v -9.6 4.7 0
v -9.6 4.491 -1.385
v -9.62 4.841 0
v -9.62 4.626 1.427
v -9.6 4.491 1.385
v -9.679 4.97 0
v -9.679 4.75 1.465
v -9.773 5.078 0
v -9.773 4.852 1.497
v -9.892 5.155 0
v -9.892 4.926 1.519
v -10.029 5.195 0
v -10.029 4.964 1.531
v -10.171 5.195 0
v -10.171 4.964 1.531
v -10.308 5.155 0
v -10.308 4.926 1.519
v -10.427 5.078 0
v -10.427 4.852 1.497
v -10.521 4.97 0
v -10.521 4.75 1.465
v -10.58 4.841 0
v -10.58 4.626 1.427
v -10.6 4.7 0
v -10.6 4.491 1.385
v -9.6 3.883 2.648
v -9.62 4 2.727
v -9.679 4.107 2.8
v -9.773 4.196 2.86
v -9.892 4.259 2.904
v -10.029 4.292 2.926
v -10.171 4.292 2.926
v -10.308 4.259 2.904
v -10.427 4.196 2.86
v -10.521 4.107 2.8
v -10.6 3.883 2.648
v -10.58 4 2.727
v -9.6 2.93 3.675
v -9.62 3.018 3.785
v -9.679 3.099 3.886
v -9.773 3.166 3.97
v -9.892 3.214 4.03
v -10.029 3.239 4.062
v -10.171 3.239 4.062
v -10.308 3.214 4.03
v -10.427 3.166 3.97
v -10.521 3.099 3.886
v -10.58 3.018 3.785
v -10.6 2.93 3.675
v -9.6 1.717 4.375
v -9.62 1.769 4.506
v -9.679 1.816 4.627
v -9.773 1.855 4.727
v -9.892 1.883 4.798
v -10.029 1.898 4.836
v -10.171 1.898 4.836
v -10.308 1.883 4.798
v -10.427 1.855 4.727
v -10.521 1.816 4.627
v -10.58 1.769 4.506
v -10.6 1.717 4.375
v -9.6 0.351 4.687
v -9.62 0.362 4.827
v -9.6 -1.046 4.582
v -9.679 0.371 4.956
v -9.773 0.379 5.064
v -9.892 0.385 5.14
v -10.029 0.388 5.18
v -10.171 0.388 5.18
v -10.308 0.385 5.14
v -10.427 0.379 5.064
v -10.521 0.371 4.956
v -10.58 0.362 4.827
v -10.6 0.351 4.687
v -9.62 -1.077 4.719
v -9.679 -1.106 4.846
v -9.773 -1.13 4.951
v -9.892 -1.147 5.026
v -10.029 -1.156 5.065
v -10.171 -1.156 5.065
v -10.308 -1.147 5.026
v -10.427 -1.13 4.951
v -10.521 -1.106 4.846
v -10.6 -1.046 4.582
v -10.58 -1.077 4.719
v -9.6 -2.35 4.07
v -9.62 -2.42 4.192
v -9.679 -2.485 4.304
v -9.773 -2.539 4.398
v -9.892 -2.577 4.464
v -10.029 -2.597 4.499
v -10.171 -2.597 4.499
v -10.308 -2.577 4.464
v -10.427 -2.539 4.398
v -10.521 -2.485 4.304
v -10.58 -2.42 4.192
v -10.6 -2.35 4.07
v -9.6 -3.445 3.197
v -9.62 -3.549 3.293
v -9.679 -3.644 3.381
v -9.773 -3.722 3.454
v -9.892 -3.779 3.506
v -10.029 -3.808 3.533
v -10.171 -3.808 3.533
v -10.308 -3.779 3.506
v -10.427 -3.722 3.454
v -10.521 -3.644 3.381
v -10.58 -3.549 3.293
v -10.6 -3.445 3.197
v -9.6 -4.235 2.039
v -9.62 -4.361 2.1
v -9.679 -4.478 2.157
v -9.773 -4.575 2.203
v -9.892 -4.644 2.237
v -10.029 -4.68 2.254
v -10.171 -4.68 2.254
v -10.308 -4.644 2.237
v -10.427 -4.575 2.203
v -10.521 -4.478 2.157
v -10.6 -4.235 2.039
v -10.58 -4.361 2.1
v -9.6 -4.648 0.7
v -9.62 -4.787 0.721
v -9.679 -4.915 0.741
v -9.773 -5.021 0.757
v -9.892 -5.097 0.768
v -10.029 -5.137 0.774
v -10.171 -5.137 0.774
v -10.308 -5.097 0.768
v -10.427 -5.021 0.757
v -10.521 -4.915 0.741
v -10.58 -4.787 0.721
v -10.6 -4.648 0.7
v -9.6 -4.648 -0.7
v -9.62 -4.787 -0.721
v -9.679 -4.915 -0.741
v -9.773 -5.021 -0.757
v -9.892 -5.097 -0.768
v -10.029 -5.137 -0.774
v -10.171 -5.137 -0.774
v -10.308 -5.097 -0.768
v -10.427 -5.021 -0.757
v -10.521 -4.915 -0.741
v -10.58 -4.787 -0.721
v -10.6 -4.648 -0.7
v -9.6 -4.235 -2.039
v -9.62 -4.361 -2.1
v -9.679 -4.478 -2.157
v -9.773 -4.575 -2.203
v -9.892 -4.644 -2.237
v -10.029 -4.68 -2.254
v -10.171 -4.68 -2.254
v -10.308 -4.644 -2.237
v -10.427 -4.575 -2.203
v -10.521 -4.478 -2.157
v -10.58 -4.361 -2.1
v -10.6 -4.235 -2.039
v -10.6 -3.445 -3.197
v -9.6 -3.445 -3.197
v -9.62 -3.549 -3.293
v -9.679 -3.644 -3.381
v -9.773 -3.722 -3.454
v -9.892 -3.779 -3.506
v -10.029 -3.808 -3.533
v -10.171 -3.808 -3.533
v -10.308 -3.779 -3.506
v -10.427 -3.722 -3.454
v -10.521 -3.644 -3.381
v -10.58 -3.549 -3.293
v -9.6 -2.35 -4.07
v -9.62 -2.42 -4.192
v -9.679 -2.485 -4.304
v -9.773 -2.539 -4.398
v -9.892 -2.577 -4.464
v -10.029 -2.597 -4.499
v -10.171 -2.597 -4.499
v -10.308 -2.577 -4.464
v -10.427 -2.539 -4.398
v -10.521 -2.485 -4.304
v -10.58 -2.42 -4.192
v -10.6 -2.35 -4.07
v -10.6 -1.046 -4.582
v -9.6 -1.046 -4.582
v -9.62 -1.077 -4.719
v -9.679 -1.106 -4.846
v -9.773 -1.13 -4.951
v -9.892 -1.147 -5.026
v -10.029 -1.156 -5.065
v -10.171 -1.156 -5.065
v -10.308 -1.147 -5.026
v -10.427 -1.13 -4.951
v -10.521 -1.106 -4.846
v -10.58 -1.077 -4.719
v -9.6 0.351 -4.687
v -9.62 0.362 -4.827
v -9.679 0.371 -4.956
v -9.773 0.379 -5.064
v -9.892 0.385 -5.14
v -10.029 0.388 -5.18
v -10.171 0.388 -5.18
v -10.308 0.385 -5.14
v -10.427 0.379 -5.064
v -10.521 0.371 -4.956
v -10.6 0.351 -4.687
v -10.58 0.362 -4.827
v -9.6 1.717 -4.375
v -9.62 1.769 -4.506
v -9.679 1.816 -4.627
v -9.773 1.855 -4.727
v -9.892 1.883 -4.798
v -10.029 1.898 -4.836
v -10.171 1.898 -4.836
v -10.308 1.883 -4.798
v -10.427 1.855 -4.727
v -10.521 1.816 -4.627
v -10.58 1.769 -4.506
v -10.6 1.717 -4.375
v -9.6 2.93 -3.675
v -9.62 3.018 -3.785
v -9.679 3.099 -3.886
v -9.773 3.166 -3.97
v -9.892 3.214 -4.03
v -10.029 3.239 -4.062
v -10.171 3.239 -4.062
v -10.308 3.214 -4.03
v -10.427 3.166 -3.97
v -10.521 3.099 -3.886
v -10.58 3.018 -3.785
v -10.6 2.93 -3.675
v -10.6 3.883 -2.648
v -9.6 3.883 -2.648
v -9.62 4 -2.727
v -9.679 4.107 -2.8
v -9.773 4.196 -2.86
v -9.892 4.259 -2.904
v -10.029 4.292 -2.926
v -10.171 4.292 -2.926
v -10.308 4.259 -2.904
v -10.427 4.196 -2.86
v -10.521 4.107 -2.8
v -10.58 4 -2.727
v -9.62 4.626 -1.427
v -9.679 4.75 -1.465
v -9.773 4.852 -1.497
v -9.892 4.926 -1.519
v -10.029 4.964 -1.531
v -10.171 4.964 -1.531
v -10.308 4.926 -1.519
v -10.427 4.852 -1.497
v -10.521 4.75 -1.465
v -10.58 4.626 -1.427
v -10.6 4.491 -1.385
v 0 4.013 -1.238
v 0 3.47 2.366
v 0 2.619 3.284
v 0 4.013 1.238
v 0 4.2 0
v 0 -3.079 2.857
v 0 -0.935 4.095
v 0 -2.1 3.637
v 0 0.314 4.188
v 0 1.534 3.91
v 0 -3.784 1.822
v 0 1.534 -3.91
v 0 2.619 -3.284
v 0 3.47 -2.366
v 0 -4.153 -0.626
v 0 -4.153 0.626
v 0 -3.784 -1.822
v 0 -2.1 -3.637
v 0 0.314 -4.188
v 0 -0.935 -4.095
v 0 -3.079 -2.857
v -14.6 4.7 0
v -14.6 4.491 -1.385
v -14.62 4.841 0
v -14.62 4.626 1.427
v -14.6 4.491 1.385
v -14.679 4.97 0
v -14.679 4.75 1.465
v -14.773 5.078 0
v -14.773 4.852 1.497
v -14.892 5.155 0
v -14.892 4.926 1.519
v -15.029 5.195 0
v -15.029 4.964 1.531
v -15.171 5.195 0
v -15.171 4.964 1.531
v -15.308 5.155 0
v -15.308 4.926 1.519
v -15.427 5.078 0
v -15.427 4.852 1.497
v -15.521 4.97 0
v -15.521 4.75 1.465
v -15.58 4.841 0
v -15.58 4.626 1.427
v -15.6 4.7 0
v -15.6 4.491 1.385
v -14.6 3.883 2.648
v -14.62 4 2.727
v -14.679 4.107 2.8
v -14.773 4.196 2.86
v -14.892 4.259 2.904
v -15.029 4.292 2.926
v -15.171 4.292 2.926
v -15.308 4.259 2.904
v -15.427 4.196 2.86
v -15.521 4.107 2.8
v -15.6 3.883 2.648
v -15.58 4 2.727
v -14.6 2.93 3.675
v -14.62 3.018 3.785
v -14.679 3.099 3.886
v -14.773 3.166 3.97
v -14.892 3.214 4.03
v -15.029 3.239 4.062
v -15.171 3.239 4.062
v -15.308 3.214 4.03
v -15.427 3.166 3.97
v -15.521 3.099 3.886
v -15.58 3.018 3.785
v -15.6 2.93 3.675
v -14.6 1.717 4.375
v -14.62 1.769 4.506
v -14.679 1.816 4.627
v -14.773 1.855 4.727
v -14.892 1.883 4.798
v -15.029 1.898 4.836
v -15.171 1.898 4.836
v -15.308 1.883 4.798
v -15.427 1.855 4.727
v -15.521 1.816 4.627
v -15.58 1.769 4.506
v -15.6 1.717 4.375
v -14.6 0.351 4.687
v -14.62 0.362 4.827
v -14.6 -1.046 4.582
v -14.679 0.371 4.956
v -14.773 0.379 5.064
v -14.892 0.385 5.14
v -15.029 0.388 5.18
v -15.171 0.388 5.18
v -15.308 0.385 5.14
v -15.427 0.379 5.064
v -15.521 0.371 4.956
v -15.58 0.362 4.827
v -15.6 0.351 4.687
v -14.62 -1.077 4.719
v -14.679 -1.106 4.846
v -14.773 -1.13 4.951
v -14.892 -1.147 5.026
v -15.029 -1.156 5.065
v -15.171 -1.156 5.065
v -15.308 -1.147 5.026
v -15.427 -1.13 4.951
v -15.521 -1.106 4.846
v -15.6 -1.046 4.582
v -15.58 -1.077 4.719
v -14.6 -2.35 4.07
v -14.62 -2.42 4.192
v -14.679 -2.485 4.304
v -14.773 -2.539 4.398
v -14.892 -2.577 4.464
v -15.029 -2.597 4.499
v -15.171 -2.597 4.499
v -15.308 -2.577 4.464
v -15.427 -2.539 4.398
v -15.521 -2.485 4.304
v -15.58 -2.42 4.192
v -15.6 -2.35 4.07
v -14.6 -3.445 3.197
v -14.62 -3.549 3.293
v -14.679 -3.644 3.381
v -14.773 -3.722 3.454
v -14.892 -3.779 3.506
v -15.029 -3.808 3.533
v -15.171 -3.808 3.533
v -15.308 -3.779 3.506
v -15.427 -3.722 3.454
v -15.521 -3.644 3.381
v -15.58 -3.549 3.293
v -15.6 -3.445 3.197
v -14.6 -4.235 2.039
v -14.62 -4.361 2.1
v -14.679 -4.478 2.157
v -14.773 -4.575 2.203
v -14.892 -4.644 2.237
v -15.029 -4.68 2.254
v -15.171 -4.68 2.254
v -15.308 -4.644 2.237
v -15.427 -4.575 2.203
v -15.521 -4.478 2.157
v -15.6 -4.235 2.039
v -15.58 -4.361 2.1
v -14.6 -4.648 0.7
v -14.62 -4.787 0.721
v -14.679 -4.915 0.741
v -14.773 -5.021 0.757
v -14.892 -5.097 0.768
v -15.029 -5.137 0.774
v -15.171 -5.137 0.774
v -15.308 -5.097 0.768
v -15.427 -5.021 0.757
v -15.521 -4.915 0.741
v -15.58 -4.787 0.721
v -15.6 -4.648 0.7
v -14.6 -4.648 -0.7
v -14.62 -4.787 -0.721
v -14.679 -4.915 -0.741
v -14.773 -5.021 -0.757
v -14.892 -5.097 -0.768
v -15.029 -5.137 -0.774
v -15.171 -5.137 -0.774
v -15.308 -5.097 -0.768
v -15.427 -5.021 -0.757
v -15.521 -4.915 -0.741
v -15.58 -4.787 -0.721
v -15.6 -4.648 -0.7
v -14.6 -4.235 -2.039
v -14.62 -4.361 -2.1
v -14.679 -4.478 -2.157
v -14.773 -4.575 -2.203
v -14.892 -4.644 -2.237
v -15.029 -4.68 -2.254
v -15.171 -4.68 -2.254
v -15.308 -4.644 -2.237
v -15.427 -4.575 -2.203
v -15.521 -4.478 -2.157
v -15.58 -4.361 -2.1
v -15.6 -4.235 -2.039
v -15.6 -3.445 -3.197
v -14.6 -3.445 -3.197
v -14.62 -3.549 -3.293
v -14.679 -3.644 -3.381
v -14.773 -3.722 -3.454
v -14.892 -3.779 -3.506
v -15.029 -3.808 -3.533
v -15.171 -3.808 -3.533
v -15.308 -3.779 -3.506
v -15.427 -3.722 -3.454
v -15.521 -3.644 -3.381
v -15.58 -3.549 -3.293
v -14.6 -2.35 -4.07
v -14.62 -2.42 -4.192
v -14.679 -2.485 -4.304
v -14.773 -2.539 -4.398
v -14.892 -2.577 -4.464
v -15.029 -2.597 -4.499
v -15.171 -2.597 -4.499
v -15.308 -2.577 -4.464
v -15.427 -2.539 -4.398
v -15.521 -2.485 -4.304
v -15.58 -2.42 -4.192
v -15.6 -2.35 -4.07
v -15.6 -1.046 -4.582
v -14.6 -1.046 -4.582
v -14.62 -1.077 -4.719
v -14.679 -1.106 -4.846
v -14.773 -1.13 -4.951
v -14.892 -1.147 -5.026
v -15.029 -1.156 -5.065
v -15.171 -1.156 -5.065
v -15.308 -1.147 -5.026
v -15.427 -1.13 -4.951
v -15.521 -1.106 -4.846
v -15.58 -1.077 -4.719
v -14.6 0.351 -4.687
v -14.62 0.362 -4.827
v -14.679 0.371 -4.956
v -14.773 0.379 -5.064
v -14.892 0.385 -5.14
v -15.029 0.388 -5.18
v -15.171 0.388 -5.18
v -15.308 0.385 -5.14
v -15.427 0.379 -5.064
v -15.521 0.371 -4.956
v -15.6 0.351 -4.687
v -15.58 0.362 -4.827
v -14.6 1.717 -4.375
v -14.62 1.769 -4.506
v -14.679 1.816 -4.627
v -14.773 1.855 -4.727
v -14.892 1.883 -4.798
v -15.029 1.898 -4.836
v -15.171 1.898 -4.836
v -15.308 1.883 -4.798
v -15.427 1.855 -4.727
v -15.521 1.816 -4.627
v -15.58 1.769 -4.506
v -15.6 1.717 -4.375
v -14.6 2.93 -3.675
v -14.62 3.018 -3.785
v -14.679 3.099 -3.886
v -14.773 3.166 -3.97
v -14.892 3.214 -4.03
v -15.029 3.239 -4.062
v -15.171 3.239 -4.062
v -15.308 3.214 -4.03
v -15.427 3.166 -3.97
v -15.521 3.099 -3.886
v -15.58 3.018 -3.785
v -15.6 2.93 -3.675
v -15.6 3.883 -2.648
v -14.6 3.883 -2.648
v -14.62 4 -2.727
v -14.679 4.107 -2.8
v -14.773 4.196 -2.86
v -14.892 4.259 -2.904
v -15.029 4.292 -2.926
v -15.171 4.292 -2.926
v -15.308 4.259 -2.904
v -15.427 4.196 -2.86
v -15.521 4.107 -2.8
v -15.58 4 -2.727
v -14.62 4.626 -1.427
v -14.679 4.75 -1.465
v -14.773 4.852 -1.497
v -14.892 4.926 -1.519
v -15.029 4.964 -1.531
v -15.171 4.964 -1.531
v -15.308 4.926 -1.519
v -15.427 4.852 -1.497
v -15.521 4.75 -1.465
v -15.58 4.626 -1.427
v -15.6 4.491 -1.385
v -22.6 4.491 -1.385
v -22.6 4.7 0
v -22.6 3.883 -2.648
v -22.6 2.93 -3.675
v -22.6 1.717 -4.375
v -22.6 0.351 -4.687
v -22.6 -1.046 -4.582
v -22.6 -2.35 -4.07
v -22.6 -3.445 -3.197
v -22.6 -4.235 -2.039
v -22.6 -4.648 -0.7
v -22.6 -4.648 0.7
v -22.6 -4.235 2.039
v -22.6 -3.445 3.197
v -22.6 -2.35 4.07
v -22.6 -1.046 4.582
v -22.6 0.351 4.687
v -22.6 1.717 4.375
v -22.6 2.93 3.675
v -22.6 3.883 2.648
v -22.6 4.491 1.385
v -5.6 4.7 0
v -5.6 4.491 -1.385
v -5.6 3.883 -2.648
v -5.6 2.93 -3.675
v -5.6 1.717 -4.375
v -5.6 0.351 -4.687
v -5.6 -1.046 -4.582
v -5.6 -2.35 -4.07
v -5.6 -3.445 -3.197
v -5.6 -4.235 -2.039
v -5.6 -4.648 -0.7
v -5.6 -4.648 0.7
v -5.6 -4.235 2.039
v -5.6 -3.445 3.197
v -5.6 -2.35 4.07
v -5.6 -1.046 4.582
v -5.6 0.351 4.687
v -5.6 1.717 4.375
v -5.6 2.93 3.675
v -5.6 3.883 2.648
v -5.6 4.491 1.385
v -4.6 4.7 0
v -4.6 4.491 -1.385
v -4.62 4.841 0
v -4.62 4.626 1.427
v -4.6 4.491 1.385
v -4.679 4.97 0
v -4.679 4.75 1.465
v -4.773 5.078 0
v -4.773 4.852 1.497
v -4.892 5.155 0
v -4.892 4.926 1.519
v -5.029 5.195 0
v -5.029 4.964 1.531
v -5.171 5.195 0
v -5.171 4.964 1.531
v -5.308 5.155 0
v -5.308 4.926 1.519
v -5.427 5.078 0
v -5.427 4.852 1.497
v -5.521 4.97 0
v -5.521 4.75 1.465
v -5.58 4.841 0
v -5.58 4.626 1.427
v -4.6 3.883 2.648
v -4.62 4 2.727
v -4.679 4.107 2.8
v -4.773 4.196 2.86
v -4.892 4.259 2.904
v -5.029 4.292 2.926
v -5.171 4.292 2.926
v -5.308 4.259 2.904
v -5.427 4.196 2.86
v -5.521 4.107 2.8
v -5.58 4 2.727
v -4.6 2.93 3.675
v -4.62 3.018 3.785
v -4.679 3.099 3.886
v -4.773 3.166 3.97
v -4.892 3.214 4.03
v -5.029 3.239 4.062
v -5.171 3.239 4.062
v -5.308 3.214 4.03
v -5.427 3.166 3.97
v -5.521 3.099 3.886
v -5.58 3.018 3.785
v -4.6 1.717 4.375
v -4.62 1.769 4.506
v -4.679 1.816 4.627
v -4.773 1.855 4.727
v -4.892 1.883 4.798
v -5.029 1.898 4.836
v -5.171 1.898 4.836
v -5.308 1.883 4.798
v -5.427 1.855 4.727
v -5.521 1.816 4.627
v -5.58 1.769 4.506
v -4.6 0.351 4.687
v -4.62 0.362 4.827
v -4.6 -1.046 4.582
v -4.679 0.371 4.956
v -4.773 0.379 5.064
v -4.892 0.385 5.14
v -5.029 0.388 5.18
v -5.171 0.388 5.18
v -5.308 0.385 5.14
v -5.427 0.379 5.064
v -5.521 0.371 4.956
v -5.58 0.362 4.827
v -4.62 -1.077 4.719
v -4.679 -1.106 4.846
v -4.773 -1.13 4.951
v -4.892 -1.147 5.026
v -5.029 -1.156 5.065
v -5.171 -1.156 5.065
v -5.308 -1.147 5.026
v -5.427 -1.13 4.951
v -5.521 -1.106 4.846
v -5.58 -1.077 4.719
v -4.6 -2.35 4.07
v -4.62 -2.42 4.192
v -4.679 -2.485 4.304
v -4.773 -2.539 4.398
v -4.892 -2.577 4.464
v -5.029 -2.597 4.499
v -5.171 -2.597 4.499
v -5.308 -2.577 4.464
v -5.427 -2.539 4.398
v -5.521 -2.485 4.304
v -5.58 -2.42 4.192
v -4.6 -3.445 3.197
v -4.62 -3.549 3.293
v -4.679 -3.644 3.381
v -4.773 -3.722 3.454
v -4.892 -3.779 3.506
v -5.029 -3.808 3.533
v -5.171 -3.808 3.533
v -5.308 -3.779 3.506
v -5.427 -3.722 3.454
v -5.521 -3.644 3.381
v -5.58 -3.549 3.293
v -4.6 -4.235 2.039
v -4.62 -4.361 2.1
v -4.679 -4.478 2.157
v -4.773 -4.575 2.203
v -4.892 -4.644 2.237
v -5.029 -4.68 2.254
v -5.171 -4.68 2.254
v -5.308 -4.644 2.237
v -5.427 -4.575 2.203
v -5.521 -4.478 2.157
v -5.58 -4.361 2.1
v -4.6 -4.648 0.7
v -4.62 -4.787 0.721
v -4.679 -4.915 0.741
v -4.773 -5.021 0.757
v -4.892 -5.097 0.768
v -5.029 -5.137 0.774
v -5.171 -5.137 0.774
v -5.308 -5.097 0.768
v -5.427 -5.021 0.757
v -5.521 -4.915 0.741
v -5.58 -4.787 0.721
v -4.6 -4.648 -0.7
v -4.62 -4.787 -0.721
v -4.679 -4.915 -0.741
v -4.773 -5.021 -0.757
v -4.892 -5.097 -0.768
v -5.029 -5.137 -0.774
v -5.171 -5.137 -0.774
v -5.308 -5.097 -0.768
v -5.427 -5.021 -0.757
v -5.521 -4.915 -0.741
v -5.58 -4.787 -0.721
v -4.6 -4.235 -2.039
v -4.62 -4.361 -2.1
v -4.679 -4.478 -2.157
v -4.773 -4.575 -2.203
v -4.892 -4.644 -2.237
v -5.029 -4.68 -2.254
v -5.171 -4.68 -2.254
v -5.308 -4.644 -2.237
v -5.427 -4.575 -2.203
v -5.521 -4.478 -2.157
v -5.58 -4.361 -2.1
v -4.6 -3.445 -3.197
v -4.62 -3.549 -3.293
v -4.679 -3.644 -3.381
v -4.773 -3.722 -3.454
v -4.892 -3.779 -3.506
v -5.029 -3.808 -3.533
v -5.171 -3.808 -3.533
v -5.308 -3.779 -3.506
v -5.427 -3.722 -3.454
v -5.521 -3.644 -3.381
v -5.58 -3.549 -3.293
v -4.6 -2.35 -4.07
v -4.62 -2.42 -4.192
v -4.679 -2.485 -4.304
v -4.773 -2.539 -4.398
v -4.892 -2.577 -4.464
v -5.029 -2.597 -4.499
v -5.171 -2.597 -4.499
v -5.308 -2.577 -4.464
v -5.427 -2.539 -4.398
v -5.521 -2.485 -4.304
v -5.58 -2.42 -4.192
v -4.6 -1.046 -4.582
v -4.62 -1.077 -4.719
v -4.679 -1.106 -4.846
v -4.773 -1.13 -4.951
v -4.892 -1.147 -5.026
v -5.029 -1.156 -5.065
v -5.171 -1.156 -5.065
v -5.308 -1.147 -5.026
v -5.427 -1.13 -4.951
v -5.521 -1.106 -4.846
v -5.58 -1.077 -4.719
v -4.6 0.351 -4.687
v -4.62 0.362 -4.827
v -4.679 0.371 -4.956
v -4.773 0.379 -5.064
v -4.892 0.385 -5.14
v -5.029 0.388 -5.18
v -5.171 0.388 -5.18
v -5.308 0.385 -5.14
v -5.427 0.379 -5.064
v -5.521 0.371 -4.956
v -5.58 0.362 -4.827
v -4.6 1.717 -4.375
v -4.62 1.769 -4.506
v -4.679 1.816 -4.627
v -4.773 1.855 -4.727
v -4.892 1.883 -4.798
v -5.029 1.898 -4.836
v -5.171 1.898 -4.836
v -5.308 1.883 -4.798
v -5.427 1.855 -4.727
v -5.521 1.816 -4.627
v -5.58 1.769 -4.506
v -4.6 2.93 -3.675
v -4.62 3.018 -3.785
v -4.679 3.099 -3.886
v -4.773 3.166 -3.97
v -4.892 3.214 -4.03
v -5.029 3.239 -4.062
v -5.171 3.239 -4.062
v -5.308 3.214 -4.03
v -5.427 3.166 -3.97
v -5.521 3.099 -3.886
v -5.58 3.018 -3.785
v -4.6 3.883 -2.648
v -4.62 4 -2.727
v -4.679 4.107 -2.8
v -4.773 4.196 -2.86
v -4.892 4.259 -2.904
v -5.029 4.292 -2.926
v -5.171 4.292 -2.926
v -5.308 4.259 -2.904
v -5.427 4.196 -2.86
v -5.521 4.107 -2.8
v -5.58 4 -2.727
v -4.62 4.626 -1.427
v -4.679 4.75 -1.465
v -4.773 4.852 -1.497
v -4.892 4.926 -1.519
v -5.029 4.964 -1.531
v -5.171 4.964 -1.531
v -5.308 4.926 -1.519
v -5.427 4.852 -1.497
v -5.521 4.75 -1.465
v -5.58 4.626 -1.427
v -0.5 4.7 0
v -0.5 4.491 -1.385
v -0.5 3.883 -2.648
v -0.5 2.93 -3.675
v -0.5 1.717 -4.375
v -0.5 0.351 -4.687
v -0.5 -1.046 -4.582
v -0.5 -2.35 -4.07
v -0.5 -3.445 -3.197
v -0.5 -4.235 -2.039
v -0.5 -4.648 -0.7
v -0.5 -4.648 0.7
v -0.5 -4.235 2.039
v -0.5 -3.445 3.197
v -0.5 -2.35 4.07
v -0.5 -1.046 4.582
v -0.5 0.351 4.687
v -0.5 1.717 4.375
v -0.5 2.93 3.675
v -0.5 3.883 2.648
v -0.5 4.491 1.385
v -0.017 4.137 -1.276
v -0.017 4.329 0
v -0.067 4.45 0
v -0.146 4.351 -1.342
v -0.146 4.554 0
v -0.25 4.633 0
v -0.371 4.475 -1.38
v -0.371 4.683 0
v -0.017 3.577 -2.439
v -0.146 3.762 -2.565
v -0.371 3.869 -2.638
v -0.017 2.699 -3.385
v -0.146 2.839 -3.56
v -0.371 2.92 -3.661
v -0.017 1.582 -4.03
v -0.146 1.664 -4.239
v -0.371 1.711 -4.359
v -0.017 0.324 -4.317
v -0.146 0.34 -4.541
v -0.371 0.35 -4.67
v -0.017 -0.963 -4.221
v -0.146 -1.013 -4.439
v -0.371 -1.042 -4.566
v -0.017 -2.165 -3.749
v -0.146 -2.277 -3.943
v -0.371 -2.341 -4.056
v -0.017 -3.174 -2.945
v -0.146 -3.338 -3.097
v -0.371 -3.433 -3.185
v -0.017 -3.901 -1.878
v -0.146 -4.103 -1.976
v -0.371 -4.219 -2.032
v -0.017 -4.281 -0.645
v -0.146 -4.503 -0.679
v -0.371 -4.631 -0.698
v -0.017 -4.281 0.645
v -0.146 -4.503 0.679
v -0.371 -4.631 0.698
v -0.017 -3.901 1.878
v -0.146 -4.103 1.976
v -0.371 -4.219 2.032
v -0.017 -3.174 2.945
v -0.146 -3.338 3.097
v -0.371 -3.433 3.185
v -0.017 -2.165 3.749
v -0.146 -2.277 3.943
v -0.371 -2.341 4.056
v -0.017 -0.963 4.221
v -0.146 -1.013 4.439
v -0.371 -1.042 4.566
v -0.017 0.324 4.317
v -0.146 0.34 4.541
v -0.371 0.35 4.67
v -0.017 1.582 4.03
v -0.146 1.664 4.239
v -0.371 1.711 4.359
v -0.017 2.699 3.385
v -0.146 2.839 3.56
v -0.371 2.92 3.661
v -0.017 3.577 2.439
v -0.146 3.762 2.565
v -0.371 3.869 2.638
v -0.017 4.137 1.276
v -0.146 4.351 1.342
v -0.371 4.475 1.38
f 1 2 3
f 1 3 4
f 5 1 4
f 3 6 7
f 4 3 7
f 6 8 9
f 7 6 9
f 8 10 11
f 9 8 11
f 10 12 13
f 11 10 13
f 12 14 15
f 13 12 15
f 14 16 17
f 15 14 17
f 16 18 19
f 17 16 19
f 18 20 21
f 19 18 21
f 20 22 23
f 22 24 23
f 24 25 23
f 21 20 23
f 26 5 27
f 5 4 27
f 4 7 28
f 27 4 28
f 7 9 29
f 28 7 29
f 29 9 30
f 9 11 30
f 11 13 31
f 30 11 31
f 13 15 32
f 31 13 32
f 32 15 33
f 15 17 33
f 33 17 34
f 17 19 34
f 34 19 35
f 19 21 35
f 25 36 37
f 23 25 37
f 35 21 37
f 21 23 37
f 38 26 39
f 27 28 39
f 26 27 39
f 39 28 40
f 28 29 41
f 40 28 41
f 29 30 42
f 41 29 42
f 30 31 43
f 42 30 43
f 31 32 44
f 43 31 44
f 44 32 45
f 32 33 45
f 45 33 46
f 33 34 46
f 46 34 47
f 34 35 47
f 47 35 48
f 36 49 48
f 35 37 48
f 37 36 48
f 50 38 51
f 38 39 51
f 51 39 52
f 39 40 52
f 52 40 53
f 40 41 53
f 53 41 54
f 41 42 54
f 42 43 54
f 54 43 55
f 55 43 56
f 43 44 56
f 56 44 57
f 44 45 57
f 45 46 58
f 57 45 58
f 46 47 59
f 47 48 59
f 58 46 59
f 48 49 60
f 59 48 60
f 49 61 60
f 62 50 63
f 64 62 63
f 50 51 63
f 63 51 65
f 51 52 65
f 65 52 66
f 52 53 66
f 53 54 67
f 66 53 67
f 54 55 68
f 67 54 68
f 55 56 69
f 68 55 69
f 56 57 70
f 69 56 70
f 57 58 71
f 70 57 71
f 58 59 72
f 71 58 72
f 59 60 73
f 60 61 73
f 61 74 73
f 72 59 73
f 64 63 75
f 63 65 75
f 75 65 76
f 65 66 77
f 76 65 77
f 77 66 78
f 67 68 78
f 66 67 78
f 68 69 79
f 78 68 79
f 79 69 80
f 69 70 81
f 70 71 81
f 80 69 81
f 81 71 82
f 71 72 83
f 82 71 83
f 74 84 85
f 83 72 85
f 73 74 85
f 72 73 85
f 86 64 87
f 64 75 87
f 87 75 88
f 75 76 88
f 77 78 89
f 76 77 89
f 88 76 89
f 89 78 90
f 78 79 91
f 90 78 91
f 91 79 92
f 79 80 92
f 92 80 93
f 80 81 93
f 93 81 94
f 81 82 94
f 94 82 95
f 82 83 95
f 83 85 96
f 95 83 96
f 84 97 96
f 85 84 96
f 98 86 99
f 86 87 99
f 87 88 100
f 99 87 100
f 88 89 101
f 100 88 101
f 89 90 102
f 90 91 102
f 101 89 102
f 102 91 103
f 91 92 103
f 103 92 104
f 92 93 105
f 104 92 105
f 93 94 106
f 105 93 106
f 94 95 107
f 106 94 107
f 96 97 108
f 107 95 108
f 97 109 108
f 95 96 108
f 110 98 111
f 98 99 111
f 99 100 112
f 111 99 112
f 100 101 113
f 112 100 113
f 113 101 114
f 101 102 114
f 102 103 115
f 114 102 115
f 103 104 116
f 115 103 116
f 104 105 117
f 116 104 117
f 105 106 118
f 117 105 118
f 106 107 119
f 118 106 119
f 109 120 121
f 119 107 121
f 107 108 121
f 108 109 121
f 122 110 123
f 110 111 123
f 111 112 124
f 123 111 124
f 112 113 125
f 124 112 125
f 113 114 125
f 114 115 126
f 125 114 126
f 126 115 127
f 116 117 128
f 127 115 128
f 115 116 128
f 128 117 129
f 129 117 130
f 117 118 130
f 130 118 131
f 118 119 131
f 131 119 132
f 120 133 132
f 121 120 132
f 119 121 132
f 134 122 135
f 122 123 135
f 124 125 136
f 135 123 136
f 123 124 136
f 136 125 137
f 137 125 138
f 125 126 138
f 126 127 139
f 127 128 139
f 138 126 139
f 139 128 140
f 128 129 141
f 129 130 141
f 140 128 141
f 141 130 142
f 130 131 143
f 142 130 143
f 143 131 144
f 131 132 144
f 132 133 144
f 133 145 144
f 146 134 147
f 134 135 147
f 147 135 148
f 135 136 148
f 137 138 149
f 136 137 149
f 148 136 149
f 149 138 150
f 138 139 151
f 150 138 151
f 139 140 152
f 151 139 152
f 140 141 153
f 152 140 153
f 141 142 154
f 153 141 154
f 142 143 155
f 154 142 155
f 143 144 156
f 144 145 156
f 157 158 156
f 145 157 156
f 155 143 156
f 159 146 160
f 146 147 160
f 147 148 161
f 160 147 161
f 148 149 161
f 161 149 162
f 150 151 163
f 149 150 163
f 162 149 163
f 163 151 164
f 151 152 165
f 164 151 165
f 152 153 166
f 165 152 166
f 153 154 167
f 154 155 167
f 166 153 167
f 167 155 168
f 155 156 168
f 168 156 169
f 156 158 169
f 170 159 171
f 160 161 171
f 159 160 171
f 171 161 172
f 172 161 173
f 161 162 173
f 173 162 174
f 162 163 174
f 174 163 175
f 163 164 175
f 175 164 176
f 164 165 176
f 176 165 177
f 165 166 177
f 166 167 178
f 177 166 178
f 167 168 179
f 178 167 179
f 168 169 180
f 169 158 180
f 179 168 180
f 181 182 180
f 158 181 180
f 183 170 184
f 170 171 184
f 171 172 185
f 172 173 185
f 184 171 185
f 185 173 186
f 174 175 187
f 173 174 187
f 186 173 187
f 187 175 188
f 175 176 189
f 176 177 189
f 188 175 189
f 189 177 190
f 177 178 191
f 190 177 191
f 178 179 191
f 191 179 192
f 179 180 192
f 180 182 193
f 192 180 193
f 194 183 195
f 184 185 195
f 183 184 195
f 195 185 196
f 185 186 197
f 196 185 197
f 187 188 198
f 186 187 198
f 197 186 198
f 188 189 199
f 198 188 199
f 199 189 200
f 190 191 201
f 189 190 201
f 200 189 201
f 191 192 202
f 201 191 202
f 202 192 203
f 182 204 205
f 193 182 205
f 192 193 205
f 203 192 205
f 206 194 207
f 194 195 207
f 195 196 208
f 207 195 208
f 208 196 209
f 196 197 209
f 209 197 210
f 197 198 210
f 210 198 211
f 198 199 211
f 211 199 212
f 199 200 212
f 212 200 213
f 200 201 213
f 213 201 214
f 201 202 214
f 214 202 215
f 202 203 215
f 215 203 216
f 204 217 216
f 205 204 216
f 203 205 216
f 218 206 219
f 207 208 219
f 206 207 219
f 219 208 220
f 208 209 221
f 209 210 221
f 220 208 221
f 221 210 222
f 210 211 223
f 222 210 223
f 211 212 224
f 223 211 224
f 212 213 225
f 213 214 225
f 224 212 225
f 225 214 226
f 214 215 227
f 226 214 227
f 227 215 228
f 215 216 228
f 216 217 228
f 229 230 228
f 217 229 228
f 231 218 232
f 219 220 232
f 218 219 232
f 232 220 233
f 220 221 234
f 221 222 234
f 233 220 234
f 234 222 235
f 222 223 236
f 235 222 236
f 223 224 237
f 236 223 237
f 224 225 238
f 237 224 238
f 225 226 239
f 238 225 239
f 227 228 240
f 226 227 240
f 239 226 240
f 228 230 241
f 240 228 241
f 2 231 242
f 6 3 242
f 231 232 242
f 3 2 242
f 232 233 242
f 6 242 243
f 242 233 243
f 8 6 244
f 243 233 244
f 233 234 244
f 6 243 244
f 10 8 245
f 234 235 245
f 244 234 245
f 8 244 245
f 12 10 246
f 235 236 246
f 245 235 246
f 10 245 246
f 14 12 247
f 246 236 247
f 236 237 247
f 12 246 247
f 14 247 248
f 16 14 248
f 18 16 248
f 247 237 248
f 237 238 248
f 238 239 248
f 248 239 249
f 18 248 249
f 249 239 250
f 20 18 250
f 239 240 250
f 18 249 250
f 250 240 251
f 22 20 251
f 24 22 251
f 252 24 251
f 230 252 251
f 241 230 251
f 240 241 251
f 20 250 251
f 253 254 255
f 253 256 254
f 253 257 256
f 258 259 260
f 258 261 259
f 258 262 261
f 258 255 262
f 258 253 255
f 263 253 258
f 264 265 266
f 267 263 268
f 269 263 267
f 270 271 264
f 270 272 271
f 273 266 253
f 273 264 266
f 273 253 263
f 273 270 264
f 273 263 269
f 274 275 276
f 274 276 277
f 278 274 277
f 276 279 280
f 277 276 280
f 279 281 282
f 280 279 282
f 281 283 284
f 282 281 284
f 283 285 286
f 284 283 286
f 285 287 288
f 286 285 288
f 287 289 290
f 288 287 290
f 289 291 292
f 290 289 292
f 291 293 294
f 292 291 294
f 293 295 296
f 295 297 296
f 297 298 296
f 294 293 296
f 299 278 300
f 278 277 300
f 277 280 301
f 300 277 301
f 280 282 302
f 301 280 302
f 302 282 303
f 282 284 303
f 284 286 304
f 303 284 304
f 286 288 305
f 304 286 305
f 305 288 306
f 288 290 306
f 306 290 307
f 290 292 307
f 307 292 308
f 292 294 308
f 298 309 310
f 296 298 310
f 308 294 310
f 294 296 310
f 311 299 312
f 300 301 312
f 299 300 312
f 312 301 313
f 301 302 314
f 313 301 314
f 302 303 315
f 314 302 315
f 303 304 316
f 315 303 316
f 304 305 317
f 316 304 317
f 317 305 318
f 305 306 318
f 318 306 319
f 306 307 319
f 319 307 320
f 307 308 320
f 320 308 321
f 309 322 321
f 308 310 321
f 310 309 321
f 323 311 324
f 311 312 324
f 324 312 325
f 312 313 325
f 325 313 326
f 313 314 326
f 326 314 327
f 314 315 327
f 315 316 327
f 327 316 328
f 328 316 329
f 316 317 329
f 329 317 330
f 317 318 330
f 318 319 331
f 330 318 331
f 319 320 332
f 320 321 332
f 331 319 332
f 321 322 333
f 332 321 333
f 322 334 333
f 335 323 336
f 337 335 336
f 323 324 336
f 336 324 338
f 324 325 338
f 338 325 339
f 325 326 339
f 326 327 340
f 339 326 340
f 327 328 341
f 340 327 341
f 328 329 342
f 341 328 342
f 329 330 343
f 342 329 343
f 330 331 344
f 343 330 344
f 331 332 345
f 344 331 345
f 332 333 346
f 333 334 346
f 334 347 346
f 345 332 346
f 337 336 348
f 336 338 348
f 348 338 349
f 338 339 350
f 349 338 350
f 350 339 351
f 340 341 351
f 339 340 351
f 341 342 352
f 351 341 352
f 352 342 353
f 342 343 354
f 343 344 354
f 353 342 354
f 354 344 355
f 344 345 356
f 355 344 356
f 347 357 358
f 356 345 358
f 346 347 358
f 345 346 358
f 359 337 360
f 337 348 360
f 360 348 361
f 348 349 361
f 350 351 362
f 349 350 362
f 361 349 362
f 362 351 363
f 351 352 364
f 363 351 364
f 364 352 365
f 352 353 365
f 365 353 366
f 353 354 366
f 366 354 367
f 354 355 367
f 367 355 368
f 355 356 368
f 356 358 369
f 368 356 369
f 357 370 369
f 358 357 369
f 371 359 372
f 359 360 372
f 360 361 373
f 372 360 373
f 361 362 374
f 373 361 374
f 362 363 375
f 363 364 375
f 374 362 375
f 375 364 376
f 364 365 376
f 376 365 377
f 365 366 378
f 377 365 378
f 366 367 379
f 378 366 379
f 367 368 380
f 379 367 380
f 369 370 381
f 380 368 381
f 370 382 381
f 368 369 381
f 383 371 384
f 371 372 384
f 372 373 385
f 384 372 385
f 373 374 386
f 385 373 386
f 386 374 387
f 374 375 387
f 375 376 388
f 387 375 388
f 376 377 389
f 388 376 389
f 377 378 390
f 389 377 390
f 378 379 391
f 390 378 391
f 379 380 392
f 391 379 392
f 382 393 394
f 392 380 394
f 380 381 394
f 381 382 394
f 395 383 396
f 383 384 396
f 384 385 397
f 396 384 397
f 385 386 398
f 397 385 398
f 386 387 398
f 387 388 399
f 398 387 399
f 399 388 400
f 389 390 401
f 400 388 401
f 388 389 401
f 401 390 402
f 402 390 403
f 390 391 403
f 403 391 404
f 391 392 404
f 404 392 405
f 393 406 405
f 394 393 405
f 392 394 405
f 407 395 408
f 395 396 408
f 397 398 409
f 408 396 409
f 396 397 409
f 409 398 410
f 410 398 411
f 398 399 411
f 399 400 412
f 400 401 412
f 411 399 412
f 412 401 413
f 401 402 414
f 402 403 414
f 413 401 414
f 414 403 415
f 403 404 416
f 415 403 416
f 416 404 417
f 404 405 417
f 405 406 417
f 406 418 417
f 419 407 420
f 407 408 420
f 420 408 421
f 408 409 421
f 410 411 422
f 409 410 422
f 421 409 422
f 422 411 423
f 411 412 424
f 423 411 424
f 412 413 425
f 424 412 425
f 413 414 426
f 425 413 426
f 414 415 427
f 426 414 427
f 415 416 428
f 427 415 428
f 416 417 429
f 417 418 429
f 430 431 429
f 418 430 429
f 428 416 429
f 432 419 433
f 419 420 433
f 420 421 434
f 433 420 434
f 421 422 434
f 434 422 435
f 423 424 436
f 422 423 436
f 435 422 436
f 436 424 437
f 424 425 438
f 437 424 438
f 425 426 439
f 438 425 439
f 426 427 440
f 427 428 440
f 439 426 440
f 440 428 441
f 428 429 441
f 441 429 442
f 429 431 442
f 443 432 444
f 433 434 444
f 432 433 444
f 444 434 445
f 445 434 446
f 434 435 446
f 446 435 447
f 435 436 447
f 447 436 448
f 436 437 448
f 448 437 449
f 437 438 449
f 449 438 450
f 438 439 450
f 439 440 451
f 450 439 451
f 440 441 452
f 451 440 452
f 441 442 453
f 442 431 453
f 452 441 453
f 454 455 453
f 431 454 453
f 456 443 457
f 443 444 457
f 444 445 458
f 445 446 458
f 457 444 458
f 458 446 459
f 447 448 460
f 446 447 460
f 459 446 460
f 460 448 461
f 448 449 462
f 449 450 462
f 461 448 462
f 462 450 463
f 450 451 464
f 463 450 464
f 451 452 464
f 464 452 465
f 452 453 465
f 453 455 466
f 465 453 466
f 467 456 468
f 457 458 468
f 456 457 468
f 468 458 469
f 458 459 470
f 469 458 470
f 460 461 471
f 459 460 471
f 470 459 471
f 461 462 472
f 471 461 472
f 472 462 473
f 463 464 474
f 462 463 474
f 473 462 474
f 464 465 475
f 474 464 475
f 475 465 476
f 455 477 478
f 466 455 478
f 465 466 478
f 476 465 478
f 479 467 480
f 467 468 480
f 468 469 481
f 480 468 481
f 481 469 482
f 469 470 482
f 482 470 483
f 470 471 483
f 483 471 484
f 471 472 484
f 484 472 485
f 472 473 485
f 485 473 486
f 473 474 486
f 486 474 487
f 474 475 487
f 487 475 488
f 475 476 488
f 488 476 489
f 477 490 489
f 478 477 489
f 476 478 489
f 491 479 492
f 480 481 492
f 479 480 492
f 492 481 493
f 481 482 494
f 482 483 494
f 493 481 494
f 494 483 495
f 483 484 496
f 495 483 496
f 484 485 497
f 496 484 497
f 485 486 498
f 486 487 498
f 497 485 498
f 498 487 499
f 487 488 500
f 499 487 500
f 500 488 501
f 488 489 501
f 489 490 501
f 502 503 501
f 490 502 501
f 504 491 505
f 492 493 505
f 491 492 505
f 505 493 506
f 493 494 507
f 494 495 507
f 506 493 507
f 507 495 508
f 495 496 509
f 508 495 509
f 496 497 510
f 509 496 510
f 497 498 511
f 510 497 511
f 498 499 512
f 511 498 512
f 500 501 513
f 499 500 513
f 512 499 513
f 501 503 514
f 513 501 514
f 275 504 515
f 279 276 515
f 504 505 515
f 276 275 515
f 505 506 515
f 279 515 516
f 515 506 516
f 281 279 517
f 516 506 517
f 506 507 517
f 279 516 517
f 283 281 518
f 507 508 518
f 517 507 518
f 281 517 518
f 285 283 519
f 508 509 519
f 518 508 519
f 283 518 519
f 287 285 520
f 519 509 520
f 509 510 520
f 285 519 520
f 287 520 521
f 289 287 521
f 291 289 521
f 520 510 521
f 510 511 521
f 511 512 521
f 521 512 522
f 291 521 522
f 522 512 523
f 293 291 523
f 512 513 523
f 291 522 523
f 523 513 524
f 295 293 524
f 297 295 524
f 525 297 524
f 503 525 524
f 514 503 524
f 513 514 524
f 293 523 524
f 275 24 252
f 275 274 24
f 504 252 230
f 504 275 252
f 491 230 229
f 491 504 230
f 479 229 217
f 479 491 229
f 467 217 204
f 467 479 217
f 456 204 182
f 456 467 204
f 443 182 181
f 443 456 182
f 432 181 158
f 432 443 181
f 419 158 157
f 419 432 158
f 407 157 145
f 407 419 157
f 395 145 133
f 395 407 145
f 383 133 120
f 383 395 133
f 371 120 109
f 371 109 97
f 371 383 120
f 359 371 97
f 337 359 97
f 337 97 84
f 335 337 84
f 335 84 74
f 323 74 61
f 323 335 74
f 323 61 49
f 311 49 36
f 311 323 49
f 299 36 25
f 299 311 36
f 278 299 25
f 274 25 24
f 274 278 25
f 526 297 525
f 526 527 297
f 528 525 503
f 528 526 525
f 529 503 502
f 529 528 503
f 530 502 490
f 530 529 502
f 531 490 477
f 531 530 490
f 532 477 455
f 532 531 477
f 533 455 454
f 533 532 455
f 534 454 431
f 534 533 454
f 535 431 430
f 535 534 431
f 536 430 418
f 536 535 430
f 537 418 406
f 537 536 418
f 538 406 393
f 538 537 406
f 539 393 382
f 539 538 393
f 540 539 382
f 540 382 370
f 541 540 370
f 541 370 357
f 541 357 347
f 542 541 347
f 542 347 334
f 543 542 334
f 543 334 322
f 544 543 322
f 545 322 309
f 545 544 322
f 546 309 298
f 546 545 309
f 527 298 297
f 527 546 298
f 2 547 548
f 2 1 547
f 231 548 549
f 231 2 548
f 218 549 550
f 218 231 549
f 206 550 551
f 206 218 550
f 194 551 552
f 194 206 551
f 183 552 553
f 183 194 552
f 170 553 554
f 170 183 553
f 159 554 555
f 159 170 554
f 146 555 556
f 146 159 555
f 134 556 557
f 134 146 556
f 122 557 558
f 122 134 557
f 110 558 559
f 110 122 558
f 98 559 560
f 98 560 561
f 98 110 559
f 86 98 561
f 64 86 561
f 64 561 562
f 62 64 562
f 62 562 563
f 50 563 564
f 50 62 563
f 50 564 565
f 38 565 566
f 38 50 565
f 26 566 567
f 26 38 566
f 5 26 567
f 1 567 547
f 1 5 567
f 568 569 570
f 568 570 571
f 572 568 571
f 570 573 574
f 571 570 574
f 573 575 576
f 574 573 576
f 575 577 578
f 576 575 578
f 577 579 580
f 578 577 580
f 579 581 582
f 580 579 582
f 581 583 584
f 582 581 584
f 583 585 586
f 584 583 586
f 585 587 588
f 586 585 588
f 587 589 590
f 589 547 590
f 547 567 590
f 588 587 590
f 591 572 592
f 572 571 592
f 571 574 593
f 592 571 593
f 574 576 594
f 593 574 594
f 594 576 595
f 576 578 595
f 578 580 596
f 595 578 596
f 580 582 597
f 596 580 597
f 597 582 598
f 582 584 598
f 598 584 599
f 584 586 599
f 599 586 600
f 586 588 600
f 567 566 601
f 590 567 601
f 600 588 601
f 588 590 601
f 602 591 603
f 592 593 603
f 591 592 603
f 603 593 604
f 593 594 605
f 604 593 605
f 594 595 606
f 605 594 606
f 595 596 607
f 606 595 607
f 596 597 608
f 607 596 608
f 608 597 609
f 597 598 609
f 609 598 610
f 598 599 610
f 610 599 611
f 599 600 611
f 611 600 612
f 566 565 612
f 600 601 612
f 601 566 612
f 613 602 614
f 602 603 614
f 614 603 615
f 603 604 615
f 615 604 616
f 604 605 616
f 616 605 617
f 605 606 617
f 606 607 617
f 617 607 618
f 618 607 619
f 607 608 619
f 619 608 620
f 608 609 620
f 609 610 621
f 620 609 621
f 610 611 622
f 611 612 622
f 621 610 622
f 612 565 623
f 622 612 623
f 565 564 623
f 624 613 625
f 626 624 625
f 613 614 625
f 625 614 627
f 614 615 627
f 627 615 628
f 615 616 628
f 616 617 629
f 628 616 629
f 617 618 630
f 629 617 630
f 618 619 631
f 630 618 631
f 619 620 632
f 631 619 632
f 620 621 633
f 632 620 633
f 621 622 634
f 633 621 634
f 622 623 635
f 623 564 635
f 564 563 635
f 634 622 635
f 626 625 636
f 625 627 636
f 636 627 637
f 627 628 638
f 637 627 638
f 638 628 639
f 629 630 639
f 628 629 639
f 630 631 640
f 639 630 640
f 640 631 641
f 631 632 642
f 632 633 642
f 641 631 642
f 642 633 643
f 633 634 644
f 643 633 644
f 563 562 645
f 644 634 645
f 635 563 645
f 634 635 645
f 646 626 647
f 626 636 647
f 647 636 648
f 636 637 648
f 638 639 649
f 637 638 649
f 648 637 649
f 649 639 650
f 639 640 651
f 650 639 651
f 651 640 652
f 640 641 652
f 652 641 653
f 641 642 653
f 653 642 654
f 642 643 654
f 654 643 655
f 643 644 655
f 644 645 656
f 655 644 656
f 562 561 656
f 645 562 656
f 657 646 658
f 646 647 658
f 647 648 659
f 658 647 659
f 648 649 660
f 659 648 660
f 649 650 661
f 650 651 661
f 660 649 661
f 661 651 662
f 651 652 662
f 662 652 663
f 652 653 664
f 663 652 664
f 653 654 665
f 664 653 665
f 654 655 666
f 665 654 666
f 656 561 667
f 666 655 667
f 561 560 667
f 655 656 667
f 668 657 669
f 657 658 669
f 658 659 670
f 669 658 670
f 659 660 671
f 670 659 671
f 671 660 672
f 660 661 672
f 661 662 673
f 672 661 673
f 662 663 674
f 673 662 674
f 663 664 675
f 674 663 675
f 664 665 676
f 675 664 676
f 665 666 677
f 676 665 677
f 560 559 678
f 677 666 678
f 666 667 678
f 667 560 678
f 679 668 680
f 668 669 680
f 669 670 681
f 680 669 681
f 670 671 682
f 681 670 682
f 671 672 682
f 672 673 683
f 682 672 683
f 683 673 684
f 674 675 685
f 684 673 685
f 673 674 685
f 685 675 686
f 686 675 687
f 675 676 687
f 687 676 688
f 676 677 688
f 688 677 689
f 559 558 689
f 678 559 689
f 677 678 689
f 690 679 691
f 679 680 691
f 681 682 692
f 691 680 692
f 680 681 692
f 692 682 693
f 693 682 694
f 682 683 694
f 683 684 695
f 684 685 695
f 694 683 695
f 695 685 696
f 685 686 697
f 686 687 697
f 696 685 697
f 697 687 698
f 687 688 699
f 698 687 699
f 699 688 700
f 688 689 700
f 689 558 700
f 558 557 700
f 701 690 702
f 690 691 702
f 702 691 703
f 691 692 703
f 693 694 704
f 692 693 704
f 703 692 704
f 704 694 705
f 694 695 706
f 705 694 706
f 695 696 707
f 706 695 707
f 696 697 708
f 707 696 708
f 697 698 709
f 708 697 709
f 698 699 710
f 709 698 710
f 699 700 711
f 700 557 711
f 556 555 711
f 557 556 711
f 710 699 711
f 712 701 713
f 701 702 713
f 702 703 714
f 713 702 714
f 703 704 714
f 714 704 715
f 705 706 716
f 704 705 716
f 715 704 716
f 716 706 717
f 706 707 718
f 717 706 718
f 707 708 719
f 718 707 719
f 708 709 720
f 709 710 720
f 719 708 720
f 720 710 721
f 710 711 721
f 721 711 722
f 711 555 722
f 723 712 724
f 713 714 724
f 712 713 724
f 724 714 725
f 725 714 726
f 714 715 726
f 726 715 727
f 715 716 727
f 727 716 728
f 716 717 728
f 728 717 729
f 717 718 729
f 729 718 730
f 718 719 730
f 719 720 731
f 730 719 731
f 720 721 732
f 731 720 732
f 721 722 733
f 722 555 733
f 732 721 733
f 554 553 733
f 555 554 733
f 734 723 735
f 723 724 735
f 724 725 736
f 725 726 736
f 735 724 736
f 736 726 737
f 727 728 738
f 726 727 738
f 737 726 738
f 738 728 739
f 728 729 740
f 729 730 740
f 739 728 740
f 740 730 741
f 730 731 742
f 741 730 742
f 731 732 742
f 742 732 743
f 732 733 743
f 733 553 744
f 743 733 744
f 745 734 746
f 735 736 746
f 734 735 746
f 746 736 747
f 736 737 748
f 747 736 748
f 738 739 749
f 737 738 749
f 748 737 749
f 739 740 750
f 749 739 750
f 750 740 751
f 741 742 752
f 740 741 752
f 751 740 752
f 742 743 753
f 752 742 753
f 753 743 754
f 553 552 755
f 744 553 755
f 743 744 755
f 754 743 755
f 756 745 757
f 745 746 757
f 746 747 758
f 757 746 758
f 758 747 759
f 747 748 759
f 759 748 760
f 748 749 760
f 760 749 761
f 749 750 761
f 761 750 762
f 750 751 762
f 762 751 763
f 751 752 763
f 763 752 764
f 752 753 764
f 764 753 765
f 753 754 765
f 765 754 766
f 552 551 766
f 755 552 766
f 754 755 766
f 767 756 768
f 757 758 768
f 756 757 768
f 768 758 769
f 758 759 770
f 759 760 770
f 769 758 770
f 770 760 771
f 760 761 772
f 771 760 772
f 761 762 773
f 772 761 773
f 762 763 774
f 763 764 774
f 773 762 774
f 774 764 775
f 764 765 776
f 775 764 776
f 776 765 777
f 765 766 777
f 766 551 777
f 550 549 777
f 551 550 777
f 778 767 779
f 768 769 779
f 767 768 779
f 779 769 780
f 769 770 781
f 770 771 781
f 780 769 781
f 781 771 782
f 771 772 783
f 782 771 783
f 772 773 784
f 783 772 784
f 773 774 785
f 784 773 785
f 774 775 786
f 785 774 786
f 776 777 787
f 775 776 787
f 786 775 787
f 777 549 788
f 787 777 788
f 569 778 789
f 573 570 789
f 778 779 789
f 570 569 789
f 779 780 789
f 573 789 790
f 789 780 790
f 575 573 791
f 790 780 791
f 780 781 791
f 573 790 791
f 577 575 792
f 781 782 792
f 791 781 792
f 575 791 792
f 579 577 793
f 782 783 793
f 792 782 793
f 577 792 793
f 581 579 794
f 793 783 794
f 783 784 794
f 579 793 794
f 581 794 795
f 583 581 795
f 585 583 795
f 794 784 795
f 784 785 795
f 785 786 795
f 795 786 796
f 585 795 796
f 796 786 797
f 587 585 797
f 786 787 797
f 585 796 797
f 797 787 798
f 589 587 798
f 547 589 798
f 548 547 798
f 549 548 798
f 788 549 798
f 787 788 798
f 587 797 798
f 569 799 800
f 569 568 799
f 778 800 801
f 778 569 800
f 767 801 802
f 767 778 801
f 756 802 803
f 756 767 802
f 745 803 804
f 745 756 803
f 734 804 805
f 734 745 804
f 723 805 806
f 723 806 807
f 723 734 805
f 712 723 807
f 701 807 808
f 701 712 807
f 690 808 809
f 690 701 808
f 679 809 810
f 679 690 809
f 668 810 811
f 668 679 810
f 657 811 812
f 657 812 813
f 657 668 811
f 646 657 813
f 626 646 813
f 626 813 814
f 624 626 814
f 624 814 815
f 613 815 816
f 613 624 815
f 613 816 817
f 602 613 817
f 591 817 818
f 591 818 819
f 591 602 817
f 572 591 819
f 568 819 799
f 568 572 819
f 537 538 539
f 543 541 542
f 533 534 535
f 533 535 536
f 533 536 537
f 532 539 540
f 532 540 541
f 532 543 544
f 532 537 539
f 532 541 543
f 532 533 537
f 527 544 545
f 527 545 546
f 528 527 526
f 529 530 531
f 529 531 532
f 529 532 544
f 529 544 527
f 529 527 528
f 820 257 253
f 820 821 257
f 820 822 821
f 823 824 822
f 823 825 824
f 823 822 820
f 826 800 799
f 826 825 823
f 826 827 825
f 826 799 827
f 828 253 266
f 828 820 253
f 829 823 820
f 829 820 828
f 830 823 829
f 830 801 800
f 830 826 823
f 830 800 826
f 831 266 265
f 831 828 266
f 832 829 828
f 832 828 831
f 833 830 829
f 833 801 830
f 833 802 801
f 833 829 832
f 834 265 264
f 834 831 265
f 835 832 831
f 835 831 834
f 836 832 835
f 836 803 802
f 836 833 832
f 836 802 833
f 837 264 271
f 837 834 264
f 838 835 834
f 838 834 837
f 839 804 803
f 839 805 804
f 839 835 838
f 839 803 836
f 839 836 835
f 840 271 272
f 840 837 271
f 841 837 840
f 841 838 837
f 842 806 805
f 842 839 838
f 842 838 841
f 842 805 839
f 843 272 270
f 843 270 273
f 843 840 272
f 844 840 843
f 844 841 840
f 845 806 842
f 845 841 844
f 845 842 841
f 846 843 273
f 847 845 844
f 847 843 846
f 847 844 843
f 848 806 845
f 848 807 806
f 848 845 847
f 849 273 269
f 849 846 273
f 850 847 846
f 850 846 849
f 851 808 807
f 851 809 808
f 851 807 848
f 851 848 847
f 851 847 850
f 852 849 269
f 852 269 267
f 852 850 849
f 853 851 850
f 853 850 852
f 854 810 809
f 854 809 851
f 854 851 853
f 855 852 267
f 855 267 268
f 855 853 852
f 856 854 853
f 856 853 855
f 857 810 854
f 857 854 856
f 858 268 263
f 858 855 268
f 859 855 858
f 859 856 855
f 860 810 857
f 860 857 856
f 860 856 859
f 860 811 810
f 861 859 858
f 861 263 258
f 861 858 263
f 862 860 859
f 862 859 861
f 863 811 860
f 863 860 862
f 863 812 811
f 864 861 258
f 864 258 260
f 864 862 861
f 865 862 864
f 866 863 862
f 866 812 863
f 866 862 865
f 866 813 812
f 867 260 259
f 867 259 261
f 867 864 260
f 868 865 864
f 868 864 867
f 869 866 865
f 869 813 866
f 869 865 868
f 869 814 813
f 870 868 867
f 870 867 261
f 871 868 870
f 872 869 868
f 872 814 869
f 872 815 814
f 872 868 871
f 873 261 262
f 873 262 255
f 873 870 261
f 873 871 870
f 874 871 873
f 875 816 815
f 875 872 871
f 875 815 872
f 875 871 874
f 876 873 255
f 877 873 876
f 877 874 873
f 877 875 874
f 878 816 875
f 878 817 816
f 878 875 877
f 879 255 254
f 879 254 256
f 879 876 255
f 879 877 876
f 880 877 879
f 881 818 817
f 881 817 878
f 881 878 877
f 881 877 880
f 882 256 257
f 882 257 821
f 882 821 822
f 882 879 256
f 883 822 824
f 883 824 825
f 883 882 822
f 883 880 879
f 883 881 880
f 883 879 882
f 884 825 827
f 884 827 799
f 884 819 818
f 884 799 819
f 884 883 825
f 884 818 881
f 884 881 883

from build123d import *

# Parameters (mm, degrees)
SKETCH2_R       = 0.5
LPATTERN1_COUNT = 3
LPATTERN1_PITCH = 5


with BuildPart() as part:
    # Sketch1 → Revolve1 (revolve)
    with BuildSketch(Plane.XY):
        with BuildLine():
            Line((-22.6, 4.7), (-22.6, 0))
            Line((-22.6, 0), (0, 0))
            Line((0, 0), (0, 4.2))
            ThreePointArc((0, 4.2), (-0.146446609, 4.553553391), (-0.5, 4.7))
            Line((-0.5, 4.7), (-22.6, 4.7))
        make_face()
    revolve(axis=Axis((0, 0, 0), (-1, 0, 0)))

    # Sketch2 → Revolve2 (revolve)
    with BuildSketch(Plane.XY):
        with Locations((-15.1, 4.7)):
            Circle(SKETCH2_R)
    revolve2 = revolve(axis=Axis((-22.6, 0, 0), (1, 0, 0)))

    # LPattern1: Revolve2 ×3
    with Locations(*[(i * LPATTERN1_PITCH, 0, 0) for i in range(1, LPATTERN1_COUNT)]):
        add(revolve2)


solid = part.part
